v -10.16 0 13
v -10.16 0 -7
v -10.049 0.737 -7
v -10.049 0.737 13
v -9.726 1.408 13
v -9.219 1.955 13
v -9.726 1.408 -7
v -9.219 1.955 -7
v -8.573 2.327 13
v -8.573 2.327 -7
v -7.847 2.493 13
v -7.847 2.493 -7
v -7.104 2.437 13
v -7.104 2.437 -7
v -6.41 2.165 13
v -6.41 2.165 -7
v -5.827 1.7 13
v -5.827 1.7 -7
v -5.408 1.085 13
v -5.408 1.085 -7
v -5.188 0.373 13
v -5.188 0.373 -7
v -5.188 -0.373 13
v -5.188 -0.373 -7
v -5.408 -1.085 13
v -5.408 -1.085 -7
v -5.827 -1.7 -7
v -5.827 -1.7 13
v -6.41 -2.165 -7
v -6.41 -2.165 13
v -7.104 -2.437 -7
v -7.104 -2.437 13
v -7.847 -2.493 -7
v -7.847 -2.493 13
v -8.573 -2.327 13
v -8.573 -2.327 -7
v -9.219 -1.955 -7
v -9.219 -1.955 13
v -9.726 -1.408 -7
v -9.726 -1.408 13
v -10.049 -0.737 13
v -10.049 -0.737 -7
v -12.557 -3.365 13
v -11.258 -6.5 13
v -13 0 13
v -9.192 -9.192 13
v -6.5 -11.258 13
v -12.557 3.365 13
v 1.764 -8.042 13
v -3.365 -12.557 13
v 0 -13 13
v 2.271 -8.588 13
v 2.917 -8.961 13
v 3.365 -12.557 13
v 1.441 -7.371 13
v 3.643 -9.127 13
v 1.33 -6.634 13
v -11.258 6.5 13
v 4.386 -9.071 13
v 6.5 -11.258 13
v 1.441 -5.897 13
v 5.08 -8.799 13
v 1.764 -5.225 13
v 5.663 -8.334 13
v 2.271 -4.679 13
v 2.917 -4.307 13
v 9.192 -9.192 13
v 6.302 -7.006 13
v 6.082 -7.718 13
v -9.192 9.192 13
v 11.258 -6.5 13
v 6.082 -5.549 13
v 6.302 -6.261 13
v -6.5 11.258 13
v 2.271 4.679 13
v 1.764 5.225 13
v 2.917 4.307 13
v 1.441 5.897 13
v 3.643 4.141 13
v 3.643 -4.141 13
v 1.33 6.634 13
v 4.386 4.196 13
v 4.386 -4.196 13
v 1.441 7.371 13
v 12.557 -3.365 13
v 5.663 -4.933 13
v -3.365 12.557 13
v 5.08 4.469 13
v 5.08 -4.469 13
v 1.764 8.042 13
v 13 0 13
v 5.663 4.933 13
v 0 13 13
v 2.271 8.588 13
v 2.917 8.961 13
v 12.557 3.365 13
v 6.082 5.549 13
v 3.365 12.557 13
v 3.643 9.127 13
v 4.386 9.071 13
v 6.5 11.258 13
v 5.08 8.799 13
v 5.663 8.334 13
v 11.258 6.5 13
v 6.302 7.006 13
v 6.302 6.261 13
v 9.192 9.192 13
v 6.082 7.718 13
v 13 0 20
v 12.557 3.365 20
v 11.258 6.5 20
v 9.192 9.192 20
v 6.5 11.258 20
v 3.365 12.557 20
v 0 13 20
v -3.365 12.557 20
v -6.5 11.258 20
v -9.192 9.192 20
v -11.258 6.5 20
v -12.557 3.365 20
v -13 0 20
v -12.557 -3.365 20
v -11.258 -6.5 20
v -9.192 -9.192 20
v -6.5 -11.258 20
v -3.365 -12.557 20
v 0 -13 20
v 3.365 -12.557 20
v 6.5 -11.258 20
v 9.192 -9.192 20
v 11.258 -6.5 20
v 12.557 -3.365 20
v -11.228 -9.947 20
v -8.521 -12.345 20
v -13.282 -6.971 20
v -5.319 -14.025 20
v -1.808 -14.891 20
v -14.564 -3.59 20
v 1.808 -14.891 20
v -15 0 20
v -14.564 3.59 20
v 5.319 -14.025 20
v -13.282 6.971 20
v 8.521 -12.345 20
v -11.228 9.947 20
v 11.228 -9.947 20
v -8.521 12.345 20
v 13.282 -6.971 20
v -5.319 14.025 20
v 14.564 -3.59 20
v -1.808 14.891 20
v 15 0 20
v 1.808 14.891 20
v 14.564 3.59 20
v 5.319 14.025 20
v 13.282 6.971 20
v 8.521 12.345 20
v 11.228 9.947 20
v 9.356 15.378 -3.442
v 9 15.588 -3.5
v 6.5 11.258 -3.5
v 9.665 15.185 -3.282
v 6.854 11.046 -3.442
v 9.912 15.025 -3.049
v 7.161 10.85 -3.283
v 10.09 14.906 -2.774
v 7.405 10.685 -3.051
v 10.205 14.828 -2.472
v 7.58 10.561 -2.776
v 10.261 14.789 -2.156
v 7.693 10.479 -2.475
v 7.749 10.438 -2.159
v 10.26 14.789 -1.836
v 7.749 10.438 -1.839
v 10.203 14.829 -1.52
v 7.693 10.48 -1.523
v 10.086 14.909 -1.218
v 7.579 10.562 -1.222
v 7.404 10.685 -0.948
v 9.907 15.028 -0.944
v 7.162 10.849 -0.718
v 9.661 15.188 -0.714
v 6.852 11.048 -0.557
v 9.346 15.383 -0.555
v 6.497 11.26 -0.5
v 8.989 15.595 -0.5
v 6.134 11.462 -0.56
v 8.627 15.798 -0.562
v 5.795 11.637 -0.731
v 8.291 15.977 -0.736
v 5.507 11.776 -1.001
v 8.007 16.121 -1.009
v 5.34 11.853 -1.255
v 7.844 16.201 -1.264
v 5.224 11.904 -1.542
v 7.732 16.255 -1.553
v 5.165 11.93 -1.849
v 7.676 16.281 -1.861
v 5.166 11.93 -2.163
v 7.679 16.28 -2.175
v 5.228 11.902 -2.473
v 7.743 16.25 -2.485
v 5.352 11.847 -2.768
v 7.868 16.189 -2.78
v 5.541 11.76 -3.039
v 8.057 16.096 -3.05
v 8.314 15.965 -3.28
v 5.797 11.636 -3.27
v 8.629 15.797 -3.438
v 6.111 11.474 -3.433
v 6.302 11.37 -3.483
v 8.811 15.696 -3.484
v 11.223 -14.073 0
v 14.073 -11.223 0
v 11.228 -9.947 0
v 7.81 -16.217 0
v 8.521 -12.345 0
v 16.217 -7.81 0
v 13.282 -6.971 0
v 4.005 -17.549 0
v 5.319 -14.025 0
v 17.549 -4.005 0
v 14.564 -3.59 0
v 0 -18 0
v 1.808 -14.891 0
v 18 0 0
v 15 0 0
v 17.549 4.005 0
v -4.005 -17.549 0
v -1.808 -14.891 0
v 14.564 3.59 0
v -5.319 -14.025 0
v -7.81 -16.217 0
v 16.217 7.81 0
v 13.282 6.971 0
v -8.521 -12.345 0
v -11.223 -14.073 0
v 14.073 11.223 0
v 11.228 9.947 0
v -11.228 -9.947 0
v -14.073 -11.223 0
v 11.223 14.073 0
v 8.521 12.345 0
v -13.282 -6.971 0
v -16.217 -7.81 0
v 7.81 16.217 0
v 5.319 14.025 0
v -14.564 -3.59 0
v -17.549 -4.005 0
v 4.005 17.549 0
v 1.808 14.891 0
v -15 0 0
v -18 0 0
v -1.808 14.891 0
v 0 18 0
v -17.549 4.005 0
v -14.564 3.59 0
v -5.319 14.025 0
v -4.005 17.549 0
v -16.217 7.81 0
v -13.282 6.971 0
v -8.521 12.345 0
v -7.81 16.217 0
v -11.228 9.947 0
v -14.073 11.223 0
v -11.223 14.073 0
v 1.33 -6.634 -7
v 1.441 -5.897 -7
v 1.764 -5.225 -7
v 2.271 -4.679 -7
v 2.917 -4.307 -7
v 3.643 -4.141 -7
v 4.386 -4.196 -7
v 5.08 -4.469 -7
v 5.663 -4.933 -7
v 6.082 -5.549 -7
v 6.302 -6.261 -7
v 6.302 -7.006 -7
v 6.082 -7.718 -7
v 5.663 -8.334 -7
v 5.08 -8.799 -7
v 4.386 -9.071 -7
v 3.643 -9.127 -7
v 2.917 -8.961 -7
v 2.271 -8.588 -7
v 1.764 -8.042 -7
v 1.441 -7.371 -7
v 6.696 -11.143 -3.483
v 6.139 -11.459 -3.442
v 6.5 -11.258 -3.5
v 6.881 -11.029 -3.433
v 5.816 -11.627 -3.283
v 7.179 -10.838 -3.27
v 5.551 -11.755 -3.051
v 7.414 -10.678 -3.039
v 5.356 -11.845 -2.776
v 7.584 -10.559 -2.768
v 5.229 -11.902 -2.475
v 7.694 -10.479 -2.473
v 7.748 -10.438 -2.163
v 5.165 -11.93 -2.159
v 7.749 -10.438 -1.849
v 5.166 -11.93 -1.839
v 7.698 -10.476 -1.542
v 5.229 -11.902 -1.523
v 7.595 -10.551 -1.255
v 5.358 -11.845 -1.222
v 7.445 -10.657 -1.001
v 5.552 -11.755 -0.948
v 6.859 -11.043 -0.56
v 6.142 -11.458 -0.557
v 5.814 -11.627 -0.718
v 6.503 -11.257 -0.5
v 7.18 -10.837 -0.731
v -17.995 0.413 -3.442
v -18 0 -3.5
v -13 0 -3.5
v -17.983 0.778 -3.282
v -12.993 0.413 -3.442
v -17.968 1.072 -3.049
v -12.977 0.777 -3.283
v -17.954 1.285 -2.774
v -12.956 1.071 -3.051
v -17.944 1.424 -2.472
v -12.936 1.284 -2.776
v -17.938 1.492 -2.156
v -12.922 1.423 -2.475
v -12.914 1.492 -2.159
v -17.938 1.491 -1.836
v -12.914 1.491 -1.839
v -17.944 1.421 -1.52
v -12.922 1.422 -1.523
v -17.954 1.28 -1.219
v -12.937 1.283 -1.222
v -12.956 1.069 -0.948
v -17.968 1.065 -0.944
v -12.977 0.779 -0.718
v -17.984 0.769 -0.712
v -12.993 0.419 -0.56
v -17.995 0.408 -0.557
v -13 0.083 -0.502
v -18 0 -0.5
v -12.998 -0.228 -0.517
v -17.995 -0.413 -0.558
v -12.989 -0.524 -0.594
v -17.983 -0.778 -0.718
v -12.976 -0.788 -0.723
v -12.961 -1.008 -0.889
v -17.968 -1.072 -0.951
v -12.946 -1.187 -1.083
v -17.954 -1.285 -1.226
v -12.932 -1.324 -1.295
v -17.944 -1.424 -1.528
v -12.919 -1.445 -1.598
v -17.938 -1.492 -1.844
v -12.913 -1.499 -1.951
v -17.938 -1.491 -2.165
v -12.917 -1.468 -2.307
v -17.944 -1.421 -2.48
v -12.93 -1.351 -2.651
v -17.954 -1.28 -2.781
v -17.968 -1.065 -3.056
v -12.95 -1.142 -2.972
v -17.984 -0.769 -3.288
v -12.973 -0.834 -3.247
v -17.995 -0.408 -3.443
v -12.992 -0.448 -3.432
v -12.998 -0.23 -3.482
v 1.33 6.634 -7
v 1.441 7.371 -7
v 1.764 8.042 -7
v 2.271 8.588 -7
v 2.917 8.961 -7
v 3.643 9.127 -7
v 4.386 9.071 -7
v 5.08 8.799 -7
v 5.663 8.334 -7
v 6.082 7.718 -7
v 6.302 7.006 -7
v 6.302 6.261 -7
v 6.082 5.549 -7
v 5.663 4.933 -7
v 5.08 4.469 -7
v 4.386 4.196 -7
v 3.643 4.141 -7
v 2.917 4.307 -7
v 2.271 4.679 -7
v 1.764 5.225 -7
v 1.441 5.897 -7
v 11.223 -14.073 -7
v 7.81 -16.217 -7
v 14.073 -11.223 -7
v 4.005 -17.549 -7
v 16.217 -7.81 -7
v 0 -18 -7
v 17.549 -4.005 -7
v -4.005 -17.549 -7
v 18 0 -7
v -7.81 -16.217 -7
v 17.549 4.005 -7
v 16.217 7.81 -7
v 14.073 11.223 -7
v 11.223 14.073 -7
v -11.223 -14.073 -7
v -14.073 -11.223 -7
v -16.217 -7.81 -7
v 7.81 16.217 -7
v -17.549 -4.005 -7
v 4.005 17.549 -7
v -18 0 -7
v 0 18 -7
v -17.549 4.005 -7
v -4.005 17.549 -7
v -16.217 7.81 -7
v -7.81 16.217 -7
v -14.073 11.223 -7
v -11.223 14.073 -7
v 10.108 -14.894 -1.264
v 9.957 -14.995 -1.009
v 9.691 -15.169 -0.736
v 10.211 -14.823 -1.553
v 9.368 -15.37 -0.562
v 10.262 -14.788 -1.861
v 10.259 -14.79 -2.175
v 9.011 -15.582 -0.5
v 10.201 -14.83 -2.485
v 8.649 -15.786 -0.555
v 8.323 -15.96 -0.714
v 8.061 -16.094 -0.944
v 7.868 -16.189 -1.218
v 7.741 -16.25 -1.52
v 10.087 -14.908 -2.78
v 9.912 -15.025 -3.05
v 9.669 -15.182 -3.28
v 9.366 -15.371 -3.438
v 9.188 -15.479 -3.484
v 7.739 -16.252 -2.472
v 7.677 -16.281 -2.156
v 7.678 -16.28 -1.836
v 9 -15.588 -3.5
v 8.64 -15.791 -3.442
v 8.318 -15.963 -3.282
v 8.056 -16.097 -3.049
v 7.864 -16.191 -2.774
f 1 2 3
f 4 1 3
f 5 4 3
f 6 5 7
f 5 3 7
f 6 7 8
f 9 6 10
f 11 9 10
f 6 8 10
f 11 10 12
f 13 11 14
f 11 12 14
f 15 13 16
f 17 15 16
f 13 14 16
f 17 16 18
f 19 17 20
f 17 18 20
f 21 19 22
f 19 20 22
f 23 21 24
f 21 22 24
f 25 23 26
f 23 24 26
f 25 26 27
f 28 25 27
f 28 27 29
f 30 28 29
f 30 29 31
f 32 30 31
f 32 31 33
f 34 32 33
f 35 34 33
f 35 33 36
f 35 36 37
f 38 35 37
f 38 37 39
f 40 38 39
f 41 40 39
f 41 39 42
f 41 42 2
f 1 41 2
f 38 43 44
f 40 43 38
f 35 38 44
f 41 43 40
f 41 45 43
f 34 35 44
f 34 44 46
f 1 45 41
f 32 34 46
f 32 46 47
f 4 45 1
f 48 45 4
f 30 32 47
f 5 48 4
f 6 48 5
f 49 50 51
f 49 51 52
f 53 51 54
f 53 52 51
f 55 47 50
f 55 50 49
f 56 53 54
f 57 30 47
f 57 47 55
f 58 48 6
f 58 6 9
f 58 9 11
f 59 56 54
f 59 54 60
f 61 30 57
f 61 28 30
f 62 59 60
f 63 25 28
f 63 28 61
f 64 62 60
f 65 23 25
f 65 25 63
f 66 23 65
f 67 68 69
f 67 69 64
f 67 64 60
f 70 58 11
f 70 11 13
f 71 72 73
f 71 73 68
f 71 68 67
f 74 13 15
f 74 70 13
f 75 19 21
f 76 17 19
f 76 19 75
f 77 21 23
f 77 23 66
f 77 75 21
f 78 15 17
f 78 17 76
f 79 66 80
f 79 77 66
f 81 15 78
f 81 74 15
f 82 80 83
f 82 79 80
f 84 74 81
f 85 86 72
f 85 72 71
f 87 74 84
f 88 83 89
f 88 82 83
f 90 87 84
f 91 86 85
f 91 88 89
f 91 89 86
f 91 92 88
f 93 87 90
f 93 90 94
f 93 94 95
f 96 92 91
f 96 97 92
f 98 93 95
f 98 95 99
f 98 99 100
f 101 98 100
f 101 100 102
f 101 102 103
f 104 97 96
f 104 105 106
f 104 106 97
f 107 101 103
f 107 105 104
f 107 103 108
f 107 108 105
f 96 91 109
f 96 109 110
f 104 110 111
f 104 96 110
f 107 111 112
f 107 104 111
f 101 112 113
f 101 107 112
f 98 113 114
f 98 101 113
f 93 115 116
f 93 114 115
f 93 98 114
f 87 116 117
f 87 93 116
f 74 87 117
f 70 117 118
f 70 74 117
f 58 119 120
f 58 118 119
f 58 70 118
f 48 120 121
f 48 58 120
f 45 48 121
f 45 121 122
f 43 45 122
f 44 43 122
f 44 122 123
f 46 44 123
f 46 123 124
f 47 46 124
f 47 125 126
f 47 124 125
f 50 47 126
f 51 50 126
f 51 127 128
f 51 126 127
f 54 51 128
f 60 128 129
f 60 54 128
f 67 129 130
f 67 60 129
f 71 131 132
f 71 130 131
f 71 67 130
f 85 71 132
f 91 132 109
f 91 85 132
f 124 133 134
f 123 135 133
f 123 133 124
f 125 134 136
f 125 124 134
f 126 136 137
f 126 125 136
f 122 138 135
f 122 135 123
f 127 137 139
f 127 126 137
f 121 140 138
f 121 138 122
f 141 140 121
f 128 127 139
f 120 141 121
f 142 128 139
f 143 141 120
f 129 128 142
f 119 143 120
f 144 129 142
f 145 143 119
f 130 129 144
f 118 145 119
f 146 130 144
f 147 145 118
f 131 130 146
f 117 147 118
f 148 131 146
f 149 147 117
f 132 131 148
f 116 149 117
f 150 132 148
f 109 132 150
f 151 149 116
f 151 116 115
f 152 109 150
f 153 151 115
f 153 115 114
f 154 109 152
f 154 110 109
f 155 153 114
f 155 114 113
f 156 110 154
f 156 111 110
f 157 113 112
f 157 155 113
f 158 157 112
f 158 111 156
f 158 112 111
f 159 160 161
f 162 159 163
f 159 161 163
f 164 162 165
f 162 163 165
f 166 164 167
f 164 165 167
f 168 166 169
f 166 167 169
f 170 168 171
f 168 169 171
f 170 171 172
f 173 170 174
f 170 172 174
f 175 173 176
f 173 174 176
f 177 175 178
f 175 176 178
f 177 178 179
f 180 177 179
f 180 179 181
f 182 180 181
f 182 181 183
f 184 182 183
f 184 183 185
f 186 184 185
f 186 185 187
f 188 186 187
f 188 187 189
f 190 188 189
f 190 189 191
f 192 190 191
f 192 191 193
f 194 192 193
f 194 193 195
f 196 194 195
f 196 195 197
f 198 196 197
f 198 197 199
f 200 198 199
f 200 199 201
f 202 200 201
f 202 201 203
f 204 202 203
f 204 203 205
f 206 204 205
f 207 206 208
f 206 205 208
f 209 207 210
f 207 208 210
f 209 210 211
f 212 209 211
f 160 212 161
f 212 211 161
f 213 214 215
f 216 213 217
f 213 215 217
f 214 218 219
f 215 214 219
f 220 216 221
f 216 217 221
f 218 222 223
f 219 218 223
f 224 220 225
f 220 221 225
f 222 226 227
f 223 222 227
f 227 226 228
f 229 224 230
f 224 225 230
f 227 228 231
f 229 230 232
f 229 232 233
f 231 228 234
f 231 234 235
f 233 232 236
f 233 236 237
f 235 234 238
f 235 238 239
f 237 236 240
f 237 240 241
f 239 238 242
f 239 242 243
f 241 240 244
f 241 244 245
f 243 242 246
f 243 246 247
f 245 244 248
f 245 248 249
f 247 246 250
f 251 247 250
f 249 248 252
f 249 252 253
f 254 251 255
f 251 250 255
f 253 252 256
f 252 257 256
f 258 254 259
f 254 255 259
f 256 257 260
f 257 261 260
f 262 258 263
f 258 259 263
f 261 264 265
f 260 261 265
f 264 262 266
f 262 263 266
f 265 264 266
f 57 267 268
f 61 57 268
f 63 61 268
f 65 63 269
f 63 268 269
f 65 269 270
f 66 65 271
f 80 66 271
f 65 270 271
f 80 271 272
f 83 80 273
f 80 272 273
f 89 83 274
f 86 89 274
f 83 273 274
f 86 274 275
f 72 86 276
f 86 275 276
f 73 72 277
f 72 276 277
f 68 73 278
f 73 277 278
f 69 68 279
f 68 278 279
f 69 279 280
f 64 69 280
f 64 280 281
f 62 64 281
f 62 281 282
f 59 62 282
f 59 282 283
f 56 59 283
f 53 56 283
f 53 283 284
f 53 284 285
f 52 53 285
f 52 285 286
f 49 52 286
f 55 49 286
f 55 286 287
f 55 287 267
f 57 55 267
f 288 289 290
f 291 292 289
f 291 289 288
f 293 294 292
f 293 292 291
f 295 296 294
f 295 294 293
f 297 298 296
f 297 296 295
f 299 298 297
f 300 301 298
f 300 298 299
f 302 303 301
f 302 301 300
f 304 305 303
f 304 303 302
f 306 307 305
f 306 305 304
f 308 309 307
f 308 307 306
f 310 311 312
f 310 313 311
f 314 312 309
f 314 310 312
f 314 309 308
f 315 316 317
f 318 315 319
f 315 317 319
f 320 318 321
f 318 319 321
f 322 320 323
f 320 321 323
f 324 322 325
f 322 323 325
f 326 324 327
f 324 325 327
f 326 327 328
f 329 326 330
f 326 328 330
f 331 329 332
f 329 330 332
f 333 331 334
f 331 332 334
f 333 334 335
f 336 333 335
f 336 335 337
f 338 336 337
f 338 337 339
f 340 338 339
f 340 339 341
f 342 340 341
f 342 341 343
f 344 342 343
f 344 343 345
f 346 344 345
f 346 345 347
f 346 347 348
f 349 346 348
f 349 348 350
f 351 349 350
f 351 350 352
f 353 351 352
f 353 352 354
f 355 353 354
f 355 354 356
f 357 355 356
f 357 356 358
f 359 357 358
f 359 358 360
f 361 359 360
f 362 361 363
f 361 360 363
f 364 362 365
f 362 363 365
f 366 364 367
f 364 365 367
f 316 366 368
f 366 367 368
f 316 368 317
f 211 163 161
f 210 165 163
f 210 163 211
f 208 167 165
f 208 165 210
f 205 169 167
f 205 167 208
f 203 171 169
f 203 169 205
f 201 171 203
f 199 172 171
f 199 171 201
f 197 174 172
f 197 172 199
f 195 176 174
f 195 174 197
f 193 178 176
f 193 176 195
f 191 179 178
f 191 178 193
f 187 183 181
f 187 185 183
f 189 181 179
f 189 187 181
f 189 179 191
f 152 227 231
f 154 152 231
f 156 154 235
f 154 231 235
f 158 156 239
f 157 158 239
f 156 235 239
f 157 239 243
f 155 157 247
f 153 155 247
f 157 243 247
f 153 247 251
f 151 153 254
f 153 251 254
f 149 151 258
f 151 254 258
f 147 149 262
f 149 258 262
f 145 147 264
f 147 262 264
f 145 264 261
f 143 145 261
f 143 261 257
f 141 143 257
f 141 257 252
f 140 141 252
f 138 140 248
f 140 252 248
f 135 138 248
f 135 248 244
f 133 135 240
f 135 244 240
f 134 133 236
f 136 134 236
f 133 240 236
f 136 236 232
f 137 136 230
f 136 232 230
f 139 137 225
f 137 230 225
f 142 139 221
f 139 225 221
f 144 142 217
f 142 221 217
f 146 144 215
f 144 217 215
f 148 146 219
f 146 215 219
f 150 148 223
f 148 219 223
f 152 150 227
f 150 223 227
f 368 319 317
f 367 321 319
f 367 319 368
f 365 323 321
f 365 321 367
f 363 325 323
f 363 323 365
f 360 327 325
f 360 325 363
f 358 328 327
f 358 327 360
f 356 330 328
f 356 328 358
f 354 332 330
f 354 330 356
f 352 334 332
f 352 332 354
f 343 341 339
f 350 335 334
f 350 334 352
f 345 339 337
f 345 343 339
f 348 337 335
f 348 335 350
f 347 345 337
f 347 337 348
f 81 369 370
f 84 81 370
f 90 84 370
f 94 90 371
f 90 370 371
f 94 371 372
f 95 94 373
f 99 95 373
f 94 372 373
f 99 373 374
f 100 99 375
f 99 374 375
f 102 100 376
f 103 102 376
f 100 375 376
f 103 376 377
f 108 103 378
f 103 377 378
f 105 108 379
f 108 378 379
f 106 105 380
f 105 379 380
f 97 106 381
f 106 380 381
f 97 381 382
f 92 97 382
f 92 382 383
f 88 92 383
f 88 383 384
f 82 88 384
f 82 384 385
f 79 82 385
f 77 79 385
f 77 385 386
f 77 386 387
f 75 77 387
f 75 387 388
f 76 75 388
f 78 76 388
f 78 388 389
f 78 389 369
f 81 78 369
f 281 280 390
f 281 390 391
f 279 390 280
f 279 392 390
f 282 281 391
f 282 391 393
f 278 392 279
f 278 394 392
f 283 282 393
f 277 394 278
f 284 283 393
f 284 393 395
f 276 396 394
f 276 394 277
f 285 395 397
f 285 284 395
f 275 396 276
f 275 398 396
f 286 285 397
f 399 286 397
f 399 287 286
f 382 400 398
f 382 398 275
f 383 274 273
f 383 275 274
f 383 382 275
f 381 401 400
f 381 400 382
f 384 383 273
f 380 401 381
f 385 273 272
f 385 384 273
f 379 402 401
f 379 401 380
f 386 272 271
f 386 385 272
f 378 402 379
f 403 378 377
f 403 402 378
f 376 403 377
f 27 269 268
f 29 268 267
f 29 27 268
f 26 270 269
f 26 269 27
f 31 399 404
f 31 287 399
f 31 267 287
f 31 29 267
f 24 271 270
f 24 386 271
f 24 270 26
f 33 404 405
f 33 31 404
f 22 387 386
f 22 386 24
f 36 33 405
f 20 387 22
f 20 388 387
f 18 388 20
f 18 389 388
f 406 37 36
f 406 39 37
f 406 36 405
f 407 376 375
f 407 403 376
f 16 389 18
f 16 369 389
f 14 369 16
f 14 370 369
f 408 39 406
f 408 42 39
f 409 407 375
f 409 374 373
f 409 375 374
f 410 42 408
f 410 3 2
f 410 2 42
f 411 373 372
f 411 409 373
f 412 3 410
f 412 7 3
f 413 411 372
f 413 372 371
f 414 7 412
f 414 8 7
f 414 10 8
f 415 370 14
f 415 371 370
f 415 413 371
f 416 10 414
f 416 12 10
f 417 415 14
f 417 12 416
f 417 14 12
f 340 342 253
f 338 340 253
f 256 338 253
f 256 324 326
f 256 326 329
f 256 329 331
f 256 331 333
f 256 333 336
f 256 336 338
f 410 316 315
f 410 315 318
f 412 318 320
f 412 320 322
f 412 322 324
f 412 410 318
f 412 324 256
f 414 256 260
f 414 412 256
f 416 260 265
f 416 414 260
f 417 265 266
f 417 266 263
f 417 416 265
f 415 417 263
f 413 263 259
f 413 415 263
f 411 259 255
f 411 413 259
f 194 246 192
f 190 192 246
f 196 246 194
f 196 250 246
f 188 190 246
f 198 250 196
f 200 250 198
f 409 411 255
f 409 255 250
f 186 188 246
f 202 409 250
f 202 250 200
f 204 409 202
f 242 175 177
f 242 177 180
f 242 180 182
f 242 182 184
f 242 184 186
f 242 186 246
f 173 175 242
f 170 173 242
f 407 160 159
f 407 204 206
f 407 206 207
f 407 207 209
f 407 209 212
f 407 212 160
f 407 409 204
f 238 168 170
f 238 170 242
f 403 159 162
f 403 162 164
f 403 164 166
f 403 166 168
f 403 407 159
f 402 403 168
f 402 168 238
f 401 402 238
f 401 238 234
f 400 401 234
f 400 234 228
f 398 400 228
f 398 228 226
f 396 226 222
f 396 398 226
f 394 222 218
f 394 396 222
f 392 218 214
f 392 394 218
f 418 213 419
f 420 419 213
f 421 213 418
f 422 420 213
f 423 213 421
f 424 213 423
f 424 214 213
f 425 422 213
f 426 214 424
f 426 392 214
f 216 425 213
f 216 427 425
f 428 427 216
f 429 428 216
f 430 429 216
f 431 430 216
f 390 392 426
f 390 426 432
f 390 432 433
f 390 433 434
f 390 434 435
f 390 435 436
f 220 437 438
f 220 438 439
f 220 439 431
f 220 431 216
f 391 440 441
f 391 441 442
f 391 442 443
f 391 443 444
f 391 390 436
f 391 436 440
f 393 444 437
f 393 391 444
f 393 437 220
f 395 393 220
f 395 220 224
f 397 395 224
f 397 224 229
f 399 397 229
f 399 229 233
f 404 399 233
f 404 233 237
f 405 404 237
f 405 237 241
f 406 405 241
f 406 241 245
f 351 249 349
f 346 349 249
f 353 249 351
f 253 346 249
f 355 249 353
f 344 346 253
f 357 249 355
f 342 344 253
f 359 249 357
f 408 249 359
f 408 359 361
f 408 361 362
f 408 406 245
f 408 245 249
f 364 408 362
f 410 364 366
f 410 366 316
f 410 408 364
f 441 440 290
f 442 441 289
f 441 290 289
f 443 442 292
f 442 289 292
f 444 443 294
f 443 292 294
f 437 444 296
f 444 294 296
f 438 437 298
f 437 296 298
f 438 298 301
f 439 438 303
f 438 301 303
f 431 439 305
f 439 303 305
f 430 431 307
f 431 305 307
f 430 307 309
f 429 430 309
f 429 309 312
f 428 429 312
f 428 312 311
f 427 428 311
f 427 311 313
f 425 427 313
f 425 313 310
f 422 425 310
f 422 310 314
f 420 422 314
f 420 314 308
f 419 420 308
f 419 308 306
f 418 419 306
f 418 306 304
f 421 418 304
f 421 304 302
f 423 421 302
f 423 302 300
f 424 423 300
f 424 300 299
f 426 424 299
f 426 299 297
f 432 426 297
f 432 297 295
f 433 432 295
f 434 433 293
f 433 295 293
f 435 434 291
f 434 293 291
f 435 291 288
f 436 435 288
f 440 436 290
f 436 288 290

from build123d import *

# Parameters (mm, degrees)
SKETCH1_R                = 15
BOSS_EXTRUDE1_DEPTH      = 20
SKETCH2_R                = 10.95
BOSS_EXTRUDE2_DEPTH      = 3.5
SKETCH4_R                = 3.05
CUT_EXTRUDE1_DEPTH       = 4.1
SKETCH5_R                = 1.5
CUT_EXTRUDE2_DEPTH       = 4
SKETCH7_R                = 10.95
SKETCH7_R_2              = 3
BOSS_EXTRUDE3_DEPTH      = 11
SKETCH9_R                = 1.5
CUT_EXTRUDE4_DEPTH       = 41.5
BOSS_EXTRUDE4_START      = 7
SKETCH12_R               = 18
SKETCH12_R_2             = 3.25
SKETCH12_R_3             = 3.05
BOSS_EXTRUDE4_DEPTH      = 7
CUT_EXTRUDE9_START       = -5
SKETCH13_R               = 1.5
CUT_EXTRUDE9_DEPTH       = 17
CIRPATTERN1_COUNT        = 3
CUT_EXTRUDE12_DEPTH      = 15
CUT_EXTRUDE12_DEPTH_BACK = 38.1079508
SKETCH15_R               = 13
SKETCH15_R_2             = 10.95
BOSS_EXTRUDE6_START      = 13
SKETCH17_R               = 13
BOSS_EXTRUDE6_DEPTH      = 20
SKETCH19_R               = 2.5
CUT_EXTRUDE13_DEPTH      = 38.107950728


with BuildPart() as part:
    # Sketch1 → Boss-Extrude1 (new body)
    with BuildSketch(Plane.XY):
        Circle(SKETCH1_R)
    extrude(amount=BOSS_EXTRUDE1_DEPTH)

    # Sketch2 → Boss-Extrude2 (add)
    with BuildSketch(Plane.XY.offset(20)):
        Circle(SKETCH2_R)
    extrude(amount=BOSS_EXTRUDE2_DEPTH)

    # Sketch4 → Cut-Extrude1 (cut)
    with BuildSketch(Plane(origin=(0, 0, 0), x_dir=(-1, 0, 0), z_dir=(0, 0, -1))):
        Circle(SKETCH4_R)
    extrude(amount=-CUT_EXTRUDE1_DEPTH, mode=Mode.SUBTRACT)

    # Sketch5 → Cut-Extrude2 (cut)
    with BuildSketch(Plane(origin=(0, 0, 4.1), x_dir=(-1, 0, 0), z_dir=(0, 0, -1))):
        Circle(SKETCH5_R)
    extrude(amount=-CUT_EXTRUDE2_DEPTH, mode=Mode.SUBTRACT)

    # Sketch7 → Boss-Extrude3 (add)
    with BuildSketch(Plane.XY.offset(23.5)):
        Circle(SKETCH7_R)
        Circle(SKETCH7_R_2, mode=Mode.SUBTRACT)
    extrude(amount=BOSS_EXTRUDE3_DEPTH)

    # Sketch9 → Cut-Extrude4 (cut, through all)
    with BuildSketch(Plane.XY.offset(34.5)):
        with Locations((7, 0)):
            Circle(SKETCH9_R)
        with Locations((-3.5, -6.062177826)):
            Circle(SKETCH9_R)
        with Locations((-3.5, 6.062177826)):
            Circle(SKETCH9_R)
    extrude(amount=-CUT_EXTRUDE4_DEPTH, mode=Mode.SUBTRACT)

    # Sketch12 → Boss-Extrude4 (add)
    with BuildSketch(Plane(origin=(0, 0, 0), x_dir=(-1, 0, 0), z_dir=(0, 0, -1)).offset(BOSS_EXTRUDE4_START)):
        Circle(SKETCH12_R)
        with Locations((3.5, 6.062177826)):
            Circle(SKETCH12_R_2, mode=Mode.SUBTRACT)
        with Locations((3.5, -6.062177826)):
            Circle(SKETCH12_R_2, mode=Mode.SUBTRACT)
        with Locations((-7, 0)):
            Circle(SKETCH12_R_2, mode=Mode.SUBTRACT)
        Circle(SKETCH12_R_3, mode=Mode.SUBTRACT)
    extrude(amount=-BOSS_EXTRUDE4_DEPTH)

    # Sketch13 → Cut-Extrude9 (cut)
    with BuildSketch(Plane(origin=(0, 0, 0), x_dir=(0, 0, -1), z_dir=(1, 0, 0)).offset(CUT_EXTRUDE9_START)):
        with Locations((2, 0)):
            Circle(SKETCH13_R)
    cut_extrude9 = extrude(amount=-CUT_EXTRUDE9_DEPTH, mode=Mode.SUBTRACT)

    # CirPattern1: Cut-Extrude9 ×3 about axis
    cirpattern1_axis = Axis((0, 0, 0), (0, 0, 1))
    for i in range(1, CIRPATTERN1_COUNT):
        add(cut_extrude9.rotate(cirpattern1_axis, i * 360 / CIRPATTERN1_COUNT), mode=Mode.SUBTRACT)

    # Sketch15 → Cut-Extrude12 (cut, two sides: drawn at the far end of the back side and taken through both)
    # profile 1 of 2: a face of its own
    with BuildSketch(Plane.XY.offset(20).offset(-CUT_EXTRUDE12_DEPTH_BACK)):
        Circle(SKETCH15_R)
        Circle(SKETCH15_R_2, mode=Mode.SUBTRACT)
    # profile 2 of 2: a face of its own
    with BuildSketch(Plane.XY.offset(20).offset(-CUT_EXTRUDE12_DEPTH_BACK)):
        Circle(SKETCH15_R_2)
    extrude(amount=CUT_EXTRUDE12_DEPTH + CUT_EXTRUDE12_DEPTH_BACK, mode=Mode.SUBTRACT)

    # Sketch17 → Boss-Extrude6 (add)
    with BuildSketch(Plane.XY.offset(BOSS_EXTRUDE6_START)):
        Circle(SKETCH17_R)
    extrude(amount=-BOSS_EXTRUDE6_DEPTH)

    # Sketch19 → Cut-Extrude13 (cut, through all)
    with BuildSketch(Plane(origin=(0, 0, -7), x_dir=(-1, 0, 0), z_dir=(0, 0, -1))):
        with Locations((7.66, 0)):
            Circle(SKETCH19_R)
        with Locations((-3.83, -6.633754593)):
            Circle(SKETCH19_R)
        with Locations((-3.83, 6.633754593)):
            Circle(SKETCH19_R)
    extrude(amount=-CUT_EXTRUDE13_DEPTH, mode=Mode.SUBTRACT)


solid = part.part
